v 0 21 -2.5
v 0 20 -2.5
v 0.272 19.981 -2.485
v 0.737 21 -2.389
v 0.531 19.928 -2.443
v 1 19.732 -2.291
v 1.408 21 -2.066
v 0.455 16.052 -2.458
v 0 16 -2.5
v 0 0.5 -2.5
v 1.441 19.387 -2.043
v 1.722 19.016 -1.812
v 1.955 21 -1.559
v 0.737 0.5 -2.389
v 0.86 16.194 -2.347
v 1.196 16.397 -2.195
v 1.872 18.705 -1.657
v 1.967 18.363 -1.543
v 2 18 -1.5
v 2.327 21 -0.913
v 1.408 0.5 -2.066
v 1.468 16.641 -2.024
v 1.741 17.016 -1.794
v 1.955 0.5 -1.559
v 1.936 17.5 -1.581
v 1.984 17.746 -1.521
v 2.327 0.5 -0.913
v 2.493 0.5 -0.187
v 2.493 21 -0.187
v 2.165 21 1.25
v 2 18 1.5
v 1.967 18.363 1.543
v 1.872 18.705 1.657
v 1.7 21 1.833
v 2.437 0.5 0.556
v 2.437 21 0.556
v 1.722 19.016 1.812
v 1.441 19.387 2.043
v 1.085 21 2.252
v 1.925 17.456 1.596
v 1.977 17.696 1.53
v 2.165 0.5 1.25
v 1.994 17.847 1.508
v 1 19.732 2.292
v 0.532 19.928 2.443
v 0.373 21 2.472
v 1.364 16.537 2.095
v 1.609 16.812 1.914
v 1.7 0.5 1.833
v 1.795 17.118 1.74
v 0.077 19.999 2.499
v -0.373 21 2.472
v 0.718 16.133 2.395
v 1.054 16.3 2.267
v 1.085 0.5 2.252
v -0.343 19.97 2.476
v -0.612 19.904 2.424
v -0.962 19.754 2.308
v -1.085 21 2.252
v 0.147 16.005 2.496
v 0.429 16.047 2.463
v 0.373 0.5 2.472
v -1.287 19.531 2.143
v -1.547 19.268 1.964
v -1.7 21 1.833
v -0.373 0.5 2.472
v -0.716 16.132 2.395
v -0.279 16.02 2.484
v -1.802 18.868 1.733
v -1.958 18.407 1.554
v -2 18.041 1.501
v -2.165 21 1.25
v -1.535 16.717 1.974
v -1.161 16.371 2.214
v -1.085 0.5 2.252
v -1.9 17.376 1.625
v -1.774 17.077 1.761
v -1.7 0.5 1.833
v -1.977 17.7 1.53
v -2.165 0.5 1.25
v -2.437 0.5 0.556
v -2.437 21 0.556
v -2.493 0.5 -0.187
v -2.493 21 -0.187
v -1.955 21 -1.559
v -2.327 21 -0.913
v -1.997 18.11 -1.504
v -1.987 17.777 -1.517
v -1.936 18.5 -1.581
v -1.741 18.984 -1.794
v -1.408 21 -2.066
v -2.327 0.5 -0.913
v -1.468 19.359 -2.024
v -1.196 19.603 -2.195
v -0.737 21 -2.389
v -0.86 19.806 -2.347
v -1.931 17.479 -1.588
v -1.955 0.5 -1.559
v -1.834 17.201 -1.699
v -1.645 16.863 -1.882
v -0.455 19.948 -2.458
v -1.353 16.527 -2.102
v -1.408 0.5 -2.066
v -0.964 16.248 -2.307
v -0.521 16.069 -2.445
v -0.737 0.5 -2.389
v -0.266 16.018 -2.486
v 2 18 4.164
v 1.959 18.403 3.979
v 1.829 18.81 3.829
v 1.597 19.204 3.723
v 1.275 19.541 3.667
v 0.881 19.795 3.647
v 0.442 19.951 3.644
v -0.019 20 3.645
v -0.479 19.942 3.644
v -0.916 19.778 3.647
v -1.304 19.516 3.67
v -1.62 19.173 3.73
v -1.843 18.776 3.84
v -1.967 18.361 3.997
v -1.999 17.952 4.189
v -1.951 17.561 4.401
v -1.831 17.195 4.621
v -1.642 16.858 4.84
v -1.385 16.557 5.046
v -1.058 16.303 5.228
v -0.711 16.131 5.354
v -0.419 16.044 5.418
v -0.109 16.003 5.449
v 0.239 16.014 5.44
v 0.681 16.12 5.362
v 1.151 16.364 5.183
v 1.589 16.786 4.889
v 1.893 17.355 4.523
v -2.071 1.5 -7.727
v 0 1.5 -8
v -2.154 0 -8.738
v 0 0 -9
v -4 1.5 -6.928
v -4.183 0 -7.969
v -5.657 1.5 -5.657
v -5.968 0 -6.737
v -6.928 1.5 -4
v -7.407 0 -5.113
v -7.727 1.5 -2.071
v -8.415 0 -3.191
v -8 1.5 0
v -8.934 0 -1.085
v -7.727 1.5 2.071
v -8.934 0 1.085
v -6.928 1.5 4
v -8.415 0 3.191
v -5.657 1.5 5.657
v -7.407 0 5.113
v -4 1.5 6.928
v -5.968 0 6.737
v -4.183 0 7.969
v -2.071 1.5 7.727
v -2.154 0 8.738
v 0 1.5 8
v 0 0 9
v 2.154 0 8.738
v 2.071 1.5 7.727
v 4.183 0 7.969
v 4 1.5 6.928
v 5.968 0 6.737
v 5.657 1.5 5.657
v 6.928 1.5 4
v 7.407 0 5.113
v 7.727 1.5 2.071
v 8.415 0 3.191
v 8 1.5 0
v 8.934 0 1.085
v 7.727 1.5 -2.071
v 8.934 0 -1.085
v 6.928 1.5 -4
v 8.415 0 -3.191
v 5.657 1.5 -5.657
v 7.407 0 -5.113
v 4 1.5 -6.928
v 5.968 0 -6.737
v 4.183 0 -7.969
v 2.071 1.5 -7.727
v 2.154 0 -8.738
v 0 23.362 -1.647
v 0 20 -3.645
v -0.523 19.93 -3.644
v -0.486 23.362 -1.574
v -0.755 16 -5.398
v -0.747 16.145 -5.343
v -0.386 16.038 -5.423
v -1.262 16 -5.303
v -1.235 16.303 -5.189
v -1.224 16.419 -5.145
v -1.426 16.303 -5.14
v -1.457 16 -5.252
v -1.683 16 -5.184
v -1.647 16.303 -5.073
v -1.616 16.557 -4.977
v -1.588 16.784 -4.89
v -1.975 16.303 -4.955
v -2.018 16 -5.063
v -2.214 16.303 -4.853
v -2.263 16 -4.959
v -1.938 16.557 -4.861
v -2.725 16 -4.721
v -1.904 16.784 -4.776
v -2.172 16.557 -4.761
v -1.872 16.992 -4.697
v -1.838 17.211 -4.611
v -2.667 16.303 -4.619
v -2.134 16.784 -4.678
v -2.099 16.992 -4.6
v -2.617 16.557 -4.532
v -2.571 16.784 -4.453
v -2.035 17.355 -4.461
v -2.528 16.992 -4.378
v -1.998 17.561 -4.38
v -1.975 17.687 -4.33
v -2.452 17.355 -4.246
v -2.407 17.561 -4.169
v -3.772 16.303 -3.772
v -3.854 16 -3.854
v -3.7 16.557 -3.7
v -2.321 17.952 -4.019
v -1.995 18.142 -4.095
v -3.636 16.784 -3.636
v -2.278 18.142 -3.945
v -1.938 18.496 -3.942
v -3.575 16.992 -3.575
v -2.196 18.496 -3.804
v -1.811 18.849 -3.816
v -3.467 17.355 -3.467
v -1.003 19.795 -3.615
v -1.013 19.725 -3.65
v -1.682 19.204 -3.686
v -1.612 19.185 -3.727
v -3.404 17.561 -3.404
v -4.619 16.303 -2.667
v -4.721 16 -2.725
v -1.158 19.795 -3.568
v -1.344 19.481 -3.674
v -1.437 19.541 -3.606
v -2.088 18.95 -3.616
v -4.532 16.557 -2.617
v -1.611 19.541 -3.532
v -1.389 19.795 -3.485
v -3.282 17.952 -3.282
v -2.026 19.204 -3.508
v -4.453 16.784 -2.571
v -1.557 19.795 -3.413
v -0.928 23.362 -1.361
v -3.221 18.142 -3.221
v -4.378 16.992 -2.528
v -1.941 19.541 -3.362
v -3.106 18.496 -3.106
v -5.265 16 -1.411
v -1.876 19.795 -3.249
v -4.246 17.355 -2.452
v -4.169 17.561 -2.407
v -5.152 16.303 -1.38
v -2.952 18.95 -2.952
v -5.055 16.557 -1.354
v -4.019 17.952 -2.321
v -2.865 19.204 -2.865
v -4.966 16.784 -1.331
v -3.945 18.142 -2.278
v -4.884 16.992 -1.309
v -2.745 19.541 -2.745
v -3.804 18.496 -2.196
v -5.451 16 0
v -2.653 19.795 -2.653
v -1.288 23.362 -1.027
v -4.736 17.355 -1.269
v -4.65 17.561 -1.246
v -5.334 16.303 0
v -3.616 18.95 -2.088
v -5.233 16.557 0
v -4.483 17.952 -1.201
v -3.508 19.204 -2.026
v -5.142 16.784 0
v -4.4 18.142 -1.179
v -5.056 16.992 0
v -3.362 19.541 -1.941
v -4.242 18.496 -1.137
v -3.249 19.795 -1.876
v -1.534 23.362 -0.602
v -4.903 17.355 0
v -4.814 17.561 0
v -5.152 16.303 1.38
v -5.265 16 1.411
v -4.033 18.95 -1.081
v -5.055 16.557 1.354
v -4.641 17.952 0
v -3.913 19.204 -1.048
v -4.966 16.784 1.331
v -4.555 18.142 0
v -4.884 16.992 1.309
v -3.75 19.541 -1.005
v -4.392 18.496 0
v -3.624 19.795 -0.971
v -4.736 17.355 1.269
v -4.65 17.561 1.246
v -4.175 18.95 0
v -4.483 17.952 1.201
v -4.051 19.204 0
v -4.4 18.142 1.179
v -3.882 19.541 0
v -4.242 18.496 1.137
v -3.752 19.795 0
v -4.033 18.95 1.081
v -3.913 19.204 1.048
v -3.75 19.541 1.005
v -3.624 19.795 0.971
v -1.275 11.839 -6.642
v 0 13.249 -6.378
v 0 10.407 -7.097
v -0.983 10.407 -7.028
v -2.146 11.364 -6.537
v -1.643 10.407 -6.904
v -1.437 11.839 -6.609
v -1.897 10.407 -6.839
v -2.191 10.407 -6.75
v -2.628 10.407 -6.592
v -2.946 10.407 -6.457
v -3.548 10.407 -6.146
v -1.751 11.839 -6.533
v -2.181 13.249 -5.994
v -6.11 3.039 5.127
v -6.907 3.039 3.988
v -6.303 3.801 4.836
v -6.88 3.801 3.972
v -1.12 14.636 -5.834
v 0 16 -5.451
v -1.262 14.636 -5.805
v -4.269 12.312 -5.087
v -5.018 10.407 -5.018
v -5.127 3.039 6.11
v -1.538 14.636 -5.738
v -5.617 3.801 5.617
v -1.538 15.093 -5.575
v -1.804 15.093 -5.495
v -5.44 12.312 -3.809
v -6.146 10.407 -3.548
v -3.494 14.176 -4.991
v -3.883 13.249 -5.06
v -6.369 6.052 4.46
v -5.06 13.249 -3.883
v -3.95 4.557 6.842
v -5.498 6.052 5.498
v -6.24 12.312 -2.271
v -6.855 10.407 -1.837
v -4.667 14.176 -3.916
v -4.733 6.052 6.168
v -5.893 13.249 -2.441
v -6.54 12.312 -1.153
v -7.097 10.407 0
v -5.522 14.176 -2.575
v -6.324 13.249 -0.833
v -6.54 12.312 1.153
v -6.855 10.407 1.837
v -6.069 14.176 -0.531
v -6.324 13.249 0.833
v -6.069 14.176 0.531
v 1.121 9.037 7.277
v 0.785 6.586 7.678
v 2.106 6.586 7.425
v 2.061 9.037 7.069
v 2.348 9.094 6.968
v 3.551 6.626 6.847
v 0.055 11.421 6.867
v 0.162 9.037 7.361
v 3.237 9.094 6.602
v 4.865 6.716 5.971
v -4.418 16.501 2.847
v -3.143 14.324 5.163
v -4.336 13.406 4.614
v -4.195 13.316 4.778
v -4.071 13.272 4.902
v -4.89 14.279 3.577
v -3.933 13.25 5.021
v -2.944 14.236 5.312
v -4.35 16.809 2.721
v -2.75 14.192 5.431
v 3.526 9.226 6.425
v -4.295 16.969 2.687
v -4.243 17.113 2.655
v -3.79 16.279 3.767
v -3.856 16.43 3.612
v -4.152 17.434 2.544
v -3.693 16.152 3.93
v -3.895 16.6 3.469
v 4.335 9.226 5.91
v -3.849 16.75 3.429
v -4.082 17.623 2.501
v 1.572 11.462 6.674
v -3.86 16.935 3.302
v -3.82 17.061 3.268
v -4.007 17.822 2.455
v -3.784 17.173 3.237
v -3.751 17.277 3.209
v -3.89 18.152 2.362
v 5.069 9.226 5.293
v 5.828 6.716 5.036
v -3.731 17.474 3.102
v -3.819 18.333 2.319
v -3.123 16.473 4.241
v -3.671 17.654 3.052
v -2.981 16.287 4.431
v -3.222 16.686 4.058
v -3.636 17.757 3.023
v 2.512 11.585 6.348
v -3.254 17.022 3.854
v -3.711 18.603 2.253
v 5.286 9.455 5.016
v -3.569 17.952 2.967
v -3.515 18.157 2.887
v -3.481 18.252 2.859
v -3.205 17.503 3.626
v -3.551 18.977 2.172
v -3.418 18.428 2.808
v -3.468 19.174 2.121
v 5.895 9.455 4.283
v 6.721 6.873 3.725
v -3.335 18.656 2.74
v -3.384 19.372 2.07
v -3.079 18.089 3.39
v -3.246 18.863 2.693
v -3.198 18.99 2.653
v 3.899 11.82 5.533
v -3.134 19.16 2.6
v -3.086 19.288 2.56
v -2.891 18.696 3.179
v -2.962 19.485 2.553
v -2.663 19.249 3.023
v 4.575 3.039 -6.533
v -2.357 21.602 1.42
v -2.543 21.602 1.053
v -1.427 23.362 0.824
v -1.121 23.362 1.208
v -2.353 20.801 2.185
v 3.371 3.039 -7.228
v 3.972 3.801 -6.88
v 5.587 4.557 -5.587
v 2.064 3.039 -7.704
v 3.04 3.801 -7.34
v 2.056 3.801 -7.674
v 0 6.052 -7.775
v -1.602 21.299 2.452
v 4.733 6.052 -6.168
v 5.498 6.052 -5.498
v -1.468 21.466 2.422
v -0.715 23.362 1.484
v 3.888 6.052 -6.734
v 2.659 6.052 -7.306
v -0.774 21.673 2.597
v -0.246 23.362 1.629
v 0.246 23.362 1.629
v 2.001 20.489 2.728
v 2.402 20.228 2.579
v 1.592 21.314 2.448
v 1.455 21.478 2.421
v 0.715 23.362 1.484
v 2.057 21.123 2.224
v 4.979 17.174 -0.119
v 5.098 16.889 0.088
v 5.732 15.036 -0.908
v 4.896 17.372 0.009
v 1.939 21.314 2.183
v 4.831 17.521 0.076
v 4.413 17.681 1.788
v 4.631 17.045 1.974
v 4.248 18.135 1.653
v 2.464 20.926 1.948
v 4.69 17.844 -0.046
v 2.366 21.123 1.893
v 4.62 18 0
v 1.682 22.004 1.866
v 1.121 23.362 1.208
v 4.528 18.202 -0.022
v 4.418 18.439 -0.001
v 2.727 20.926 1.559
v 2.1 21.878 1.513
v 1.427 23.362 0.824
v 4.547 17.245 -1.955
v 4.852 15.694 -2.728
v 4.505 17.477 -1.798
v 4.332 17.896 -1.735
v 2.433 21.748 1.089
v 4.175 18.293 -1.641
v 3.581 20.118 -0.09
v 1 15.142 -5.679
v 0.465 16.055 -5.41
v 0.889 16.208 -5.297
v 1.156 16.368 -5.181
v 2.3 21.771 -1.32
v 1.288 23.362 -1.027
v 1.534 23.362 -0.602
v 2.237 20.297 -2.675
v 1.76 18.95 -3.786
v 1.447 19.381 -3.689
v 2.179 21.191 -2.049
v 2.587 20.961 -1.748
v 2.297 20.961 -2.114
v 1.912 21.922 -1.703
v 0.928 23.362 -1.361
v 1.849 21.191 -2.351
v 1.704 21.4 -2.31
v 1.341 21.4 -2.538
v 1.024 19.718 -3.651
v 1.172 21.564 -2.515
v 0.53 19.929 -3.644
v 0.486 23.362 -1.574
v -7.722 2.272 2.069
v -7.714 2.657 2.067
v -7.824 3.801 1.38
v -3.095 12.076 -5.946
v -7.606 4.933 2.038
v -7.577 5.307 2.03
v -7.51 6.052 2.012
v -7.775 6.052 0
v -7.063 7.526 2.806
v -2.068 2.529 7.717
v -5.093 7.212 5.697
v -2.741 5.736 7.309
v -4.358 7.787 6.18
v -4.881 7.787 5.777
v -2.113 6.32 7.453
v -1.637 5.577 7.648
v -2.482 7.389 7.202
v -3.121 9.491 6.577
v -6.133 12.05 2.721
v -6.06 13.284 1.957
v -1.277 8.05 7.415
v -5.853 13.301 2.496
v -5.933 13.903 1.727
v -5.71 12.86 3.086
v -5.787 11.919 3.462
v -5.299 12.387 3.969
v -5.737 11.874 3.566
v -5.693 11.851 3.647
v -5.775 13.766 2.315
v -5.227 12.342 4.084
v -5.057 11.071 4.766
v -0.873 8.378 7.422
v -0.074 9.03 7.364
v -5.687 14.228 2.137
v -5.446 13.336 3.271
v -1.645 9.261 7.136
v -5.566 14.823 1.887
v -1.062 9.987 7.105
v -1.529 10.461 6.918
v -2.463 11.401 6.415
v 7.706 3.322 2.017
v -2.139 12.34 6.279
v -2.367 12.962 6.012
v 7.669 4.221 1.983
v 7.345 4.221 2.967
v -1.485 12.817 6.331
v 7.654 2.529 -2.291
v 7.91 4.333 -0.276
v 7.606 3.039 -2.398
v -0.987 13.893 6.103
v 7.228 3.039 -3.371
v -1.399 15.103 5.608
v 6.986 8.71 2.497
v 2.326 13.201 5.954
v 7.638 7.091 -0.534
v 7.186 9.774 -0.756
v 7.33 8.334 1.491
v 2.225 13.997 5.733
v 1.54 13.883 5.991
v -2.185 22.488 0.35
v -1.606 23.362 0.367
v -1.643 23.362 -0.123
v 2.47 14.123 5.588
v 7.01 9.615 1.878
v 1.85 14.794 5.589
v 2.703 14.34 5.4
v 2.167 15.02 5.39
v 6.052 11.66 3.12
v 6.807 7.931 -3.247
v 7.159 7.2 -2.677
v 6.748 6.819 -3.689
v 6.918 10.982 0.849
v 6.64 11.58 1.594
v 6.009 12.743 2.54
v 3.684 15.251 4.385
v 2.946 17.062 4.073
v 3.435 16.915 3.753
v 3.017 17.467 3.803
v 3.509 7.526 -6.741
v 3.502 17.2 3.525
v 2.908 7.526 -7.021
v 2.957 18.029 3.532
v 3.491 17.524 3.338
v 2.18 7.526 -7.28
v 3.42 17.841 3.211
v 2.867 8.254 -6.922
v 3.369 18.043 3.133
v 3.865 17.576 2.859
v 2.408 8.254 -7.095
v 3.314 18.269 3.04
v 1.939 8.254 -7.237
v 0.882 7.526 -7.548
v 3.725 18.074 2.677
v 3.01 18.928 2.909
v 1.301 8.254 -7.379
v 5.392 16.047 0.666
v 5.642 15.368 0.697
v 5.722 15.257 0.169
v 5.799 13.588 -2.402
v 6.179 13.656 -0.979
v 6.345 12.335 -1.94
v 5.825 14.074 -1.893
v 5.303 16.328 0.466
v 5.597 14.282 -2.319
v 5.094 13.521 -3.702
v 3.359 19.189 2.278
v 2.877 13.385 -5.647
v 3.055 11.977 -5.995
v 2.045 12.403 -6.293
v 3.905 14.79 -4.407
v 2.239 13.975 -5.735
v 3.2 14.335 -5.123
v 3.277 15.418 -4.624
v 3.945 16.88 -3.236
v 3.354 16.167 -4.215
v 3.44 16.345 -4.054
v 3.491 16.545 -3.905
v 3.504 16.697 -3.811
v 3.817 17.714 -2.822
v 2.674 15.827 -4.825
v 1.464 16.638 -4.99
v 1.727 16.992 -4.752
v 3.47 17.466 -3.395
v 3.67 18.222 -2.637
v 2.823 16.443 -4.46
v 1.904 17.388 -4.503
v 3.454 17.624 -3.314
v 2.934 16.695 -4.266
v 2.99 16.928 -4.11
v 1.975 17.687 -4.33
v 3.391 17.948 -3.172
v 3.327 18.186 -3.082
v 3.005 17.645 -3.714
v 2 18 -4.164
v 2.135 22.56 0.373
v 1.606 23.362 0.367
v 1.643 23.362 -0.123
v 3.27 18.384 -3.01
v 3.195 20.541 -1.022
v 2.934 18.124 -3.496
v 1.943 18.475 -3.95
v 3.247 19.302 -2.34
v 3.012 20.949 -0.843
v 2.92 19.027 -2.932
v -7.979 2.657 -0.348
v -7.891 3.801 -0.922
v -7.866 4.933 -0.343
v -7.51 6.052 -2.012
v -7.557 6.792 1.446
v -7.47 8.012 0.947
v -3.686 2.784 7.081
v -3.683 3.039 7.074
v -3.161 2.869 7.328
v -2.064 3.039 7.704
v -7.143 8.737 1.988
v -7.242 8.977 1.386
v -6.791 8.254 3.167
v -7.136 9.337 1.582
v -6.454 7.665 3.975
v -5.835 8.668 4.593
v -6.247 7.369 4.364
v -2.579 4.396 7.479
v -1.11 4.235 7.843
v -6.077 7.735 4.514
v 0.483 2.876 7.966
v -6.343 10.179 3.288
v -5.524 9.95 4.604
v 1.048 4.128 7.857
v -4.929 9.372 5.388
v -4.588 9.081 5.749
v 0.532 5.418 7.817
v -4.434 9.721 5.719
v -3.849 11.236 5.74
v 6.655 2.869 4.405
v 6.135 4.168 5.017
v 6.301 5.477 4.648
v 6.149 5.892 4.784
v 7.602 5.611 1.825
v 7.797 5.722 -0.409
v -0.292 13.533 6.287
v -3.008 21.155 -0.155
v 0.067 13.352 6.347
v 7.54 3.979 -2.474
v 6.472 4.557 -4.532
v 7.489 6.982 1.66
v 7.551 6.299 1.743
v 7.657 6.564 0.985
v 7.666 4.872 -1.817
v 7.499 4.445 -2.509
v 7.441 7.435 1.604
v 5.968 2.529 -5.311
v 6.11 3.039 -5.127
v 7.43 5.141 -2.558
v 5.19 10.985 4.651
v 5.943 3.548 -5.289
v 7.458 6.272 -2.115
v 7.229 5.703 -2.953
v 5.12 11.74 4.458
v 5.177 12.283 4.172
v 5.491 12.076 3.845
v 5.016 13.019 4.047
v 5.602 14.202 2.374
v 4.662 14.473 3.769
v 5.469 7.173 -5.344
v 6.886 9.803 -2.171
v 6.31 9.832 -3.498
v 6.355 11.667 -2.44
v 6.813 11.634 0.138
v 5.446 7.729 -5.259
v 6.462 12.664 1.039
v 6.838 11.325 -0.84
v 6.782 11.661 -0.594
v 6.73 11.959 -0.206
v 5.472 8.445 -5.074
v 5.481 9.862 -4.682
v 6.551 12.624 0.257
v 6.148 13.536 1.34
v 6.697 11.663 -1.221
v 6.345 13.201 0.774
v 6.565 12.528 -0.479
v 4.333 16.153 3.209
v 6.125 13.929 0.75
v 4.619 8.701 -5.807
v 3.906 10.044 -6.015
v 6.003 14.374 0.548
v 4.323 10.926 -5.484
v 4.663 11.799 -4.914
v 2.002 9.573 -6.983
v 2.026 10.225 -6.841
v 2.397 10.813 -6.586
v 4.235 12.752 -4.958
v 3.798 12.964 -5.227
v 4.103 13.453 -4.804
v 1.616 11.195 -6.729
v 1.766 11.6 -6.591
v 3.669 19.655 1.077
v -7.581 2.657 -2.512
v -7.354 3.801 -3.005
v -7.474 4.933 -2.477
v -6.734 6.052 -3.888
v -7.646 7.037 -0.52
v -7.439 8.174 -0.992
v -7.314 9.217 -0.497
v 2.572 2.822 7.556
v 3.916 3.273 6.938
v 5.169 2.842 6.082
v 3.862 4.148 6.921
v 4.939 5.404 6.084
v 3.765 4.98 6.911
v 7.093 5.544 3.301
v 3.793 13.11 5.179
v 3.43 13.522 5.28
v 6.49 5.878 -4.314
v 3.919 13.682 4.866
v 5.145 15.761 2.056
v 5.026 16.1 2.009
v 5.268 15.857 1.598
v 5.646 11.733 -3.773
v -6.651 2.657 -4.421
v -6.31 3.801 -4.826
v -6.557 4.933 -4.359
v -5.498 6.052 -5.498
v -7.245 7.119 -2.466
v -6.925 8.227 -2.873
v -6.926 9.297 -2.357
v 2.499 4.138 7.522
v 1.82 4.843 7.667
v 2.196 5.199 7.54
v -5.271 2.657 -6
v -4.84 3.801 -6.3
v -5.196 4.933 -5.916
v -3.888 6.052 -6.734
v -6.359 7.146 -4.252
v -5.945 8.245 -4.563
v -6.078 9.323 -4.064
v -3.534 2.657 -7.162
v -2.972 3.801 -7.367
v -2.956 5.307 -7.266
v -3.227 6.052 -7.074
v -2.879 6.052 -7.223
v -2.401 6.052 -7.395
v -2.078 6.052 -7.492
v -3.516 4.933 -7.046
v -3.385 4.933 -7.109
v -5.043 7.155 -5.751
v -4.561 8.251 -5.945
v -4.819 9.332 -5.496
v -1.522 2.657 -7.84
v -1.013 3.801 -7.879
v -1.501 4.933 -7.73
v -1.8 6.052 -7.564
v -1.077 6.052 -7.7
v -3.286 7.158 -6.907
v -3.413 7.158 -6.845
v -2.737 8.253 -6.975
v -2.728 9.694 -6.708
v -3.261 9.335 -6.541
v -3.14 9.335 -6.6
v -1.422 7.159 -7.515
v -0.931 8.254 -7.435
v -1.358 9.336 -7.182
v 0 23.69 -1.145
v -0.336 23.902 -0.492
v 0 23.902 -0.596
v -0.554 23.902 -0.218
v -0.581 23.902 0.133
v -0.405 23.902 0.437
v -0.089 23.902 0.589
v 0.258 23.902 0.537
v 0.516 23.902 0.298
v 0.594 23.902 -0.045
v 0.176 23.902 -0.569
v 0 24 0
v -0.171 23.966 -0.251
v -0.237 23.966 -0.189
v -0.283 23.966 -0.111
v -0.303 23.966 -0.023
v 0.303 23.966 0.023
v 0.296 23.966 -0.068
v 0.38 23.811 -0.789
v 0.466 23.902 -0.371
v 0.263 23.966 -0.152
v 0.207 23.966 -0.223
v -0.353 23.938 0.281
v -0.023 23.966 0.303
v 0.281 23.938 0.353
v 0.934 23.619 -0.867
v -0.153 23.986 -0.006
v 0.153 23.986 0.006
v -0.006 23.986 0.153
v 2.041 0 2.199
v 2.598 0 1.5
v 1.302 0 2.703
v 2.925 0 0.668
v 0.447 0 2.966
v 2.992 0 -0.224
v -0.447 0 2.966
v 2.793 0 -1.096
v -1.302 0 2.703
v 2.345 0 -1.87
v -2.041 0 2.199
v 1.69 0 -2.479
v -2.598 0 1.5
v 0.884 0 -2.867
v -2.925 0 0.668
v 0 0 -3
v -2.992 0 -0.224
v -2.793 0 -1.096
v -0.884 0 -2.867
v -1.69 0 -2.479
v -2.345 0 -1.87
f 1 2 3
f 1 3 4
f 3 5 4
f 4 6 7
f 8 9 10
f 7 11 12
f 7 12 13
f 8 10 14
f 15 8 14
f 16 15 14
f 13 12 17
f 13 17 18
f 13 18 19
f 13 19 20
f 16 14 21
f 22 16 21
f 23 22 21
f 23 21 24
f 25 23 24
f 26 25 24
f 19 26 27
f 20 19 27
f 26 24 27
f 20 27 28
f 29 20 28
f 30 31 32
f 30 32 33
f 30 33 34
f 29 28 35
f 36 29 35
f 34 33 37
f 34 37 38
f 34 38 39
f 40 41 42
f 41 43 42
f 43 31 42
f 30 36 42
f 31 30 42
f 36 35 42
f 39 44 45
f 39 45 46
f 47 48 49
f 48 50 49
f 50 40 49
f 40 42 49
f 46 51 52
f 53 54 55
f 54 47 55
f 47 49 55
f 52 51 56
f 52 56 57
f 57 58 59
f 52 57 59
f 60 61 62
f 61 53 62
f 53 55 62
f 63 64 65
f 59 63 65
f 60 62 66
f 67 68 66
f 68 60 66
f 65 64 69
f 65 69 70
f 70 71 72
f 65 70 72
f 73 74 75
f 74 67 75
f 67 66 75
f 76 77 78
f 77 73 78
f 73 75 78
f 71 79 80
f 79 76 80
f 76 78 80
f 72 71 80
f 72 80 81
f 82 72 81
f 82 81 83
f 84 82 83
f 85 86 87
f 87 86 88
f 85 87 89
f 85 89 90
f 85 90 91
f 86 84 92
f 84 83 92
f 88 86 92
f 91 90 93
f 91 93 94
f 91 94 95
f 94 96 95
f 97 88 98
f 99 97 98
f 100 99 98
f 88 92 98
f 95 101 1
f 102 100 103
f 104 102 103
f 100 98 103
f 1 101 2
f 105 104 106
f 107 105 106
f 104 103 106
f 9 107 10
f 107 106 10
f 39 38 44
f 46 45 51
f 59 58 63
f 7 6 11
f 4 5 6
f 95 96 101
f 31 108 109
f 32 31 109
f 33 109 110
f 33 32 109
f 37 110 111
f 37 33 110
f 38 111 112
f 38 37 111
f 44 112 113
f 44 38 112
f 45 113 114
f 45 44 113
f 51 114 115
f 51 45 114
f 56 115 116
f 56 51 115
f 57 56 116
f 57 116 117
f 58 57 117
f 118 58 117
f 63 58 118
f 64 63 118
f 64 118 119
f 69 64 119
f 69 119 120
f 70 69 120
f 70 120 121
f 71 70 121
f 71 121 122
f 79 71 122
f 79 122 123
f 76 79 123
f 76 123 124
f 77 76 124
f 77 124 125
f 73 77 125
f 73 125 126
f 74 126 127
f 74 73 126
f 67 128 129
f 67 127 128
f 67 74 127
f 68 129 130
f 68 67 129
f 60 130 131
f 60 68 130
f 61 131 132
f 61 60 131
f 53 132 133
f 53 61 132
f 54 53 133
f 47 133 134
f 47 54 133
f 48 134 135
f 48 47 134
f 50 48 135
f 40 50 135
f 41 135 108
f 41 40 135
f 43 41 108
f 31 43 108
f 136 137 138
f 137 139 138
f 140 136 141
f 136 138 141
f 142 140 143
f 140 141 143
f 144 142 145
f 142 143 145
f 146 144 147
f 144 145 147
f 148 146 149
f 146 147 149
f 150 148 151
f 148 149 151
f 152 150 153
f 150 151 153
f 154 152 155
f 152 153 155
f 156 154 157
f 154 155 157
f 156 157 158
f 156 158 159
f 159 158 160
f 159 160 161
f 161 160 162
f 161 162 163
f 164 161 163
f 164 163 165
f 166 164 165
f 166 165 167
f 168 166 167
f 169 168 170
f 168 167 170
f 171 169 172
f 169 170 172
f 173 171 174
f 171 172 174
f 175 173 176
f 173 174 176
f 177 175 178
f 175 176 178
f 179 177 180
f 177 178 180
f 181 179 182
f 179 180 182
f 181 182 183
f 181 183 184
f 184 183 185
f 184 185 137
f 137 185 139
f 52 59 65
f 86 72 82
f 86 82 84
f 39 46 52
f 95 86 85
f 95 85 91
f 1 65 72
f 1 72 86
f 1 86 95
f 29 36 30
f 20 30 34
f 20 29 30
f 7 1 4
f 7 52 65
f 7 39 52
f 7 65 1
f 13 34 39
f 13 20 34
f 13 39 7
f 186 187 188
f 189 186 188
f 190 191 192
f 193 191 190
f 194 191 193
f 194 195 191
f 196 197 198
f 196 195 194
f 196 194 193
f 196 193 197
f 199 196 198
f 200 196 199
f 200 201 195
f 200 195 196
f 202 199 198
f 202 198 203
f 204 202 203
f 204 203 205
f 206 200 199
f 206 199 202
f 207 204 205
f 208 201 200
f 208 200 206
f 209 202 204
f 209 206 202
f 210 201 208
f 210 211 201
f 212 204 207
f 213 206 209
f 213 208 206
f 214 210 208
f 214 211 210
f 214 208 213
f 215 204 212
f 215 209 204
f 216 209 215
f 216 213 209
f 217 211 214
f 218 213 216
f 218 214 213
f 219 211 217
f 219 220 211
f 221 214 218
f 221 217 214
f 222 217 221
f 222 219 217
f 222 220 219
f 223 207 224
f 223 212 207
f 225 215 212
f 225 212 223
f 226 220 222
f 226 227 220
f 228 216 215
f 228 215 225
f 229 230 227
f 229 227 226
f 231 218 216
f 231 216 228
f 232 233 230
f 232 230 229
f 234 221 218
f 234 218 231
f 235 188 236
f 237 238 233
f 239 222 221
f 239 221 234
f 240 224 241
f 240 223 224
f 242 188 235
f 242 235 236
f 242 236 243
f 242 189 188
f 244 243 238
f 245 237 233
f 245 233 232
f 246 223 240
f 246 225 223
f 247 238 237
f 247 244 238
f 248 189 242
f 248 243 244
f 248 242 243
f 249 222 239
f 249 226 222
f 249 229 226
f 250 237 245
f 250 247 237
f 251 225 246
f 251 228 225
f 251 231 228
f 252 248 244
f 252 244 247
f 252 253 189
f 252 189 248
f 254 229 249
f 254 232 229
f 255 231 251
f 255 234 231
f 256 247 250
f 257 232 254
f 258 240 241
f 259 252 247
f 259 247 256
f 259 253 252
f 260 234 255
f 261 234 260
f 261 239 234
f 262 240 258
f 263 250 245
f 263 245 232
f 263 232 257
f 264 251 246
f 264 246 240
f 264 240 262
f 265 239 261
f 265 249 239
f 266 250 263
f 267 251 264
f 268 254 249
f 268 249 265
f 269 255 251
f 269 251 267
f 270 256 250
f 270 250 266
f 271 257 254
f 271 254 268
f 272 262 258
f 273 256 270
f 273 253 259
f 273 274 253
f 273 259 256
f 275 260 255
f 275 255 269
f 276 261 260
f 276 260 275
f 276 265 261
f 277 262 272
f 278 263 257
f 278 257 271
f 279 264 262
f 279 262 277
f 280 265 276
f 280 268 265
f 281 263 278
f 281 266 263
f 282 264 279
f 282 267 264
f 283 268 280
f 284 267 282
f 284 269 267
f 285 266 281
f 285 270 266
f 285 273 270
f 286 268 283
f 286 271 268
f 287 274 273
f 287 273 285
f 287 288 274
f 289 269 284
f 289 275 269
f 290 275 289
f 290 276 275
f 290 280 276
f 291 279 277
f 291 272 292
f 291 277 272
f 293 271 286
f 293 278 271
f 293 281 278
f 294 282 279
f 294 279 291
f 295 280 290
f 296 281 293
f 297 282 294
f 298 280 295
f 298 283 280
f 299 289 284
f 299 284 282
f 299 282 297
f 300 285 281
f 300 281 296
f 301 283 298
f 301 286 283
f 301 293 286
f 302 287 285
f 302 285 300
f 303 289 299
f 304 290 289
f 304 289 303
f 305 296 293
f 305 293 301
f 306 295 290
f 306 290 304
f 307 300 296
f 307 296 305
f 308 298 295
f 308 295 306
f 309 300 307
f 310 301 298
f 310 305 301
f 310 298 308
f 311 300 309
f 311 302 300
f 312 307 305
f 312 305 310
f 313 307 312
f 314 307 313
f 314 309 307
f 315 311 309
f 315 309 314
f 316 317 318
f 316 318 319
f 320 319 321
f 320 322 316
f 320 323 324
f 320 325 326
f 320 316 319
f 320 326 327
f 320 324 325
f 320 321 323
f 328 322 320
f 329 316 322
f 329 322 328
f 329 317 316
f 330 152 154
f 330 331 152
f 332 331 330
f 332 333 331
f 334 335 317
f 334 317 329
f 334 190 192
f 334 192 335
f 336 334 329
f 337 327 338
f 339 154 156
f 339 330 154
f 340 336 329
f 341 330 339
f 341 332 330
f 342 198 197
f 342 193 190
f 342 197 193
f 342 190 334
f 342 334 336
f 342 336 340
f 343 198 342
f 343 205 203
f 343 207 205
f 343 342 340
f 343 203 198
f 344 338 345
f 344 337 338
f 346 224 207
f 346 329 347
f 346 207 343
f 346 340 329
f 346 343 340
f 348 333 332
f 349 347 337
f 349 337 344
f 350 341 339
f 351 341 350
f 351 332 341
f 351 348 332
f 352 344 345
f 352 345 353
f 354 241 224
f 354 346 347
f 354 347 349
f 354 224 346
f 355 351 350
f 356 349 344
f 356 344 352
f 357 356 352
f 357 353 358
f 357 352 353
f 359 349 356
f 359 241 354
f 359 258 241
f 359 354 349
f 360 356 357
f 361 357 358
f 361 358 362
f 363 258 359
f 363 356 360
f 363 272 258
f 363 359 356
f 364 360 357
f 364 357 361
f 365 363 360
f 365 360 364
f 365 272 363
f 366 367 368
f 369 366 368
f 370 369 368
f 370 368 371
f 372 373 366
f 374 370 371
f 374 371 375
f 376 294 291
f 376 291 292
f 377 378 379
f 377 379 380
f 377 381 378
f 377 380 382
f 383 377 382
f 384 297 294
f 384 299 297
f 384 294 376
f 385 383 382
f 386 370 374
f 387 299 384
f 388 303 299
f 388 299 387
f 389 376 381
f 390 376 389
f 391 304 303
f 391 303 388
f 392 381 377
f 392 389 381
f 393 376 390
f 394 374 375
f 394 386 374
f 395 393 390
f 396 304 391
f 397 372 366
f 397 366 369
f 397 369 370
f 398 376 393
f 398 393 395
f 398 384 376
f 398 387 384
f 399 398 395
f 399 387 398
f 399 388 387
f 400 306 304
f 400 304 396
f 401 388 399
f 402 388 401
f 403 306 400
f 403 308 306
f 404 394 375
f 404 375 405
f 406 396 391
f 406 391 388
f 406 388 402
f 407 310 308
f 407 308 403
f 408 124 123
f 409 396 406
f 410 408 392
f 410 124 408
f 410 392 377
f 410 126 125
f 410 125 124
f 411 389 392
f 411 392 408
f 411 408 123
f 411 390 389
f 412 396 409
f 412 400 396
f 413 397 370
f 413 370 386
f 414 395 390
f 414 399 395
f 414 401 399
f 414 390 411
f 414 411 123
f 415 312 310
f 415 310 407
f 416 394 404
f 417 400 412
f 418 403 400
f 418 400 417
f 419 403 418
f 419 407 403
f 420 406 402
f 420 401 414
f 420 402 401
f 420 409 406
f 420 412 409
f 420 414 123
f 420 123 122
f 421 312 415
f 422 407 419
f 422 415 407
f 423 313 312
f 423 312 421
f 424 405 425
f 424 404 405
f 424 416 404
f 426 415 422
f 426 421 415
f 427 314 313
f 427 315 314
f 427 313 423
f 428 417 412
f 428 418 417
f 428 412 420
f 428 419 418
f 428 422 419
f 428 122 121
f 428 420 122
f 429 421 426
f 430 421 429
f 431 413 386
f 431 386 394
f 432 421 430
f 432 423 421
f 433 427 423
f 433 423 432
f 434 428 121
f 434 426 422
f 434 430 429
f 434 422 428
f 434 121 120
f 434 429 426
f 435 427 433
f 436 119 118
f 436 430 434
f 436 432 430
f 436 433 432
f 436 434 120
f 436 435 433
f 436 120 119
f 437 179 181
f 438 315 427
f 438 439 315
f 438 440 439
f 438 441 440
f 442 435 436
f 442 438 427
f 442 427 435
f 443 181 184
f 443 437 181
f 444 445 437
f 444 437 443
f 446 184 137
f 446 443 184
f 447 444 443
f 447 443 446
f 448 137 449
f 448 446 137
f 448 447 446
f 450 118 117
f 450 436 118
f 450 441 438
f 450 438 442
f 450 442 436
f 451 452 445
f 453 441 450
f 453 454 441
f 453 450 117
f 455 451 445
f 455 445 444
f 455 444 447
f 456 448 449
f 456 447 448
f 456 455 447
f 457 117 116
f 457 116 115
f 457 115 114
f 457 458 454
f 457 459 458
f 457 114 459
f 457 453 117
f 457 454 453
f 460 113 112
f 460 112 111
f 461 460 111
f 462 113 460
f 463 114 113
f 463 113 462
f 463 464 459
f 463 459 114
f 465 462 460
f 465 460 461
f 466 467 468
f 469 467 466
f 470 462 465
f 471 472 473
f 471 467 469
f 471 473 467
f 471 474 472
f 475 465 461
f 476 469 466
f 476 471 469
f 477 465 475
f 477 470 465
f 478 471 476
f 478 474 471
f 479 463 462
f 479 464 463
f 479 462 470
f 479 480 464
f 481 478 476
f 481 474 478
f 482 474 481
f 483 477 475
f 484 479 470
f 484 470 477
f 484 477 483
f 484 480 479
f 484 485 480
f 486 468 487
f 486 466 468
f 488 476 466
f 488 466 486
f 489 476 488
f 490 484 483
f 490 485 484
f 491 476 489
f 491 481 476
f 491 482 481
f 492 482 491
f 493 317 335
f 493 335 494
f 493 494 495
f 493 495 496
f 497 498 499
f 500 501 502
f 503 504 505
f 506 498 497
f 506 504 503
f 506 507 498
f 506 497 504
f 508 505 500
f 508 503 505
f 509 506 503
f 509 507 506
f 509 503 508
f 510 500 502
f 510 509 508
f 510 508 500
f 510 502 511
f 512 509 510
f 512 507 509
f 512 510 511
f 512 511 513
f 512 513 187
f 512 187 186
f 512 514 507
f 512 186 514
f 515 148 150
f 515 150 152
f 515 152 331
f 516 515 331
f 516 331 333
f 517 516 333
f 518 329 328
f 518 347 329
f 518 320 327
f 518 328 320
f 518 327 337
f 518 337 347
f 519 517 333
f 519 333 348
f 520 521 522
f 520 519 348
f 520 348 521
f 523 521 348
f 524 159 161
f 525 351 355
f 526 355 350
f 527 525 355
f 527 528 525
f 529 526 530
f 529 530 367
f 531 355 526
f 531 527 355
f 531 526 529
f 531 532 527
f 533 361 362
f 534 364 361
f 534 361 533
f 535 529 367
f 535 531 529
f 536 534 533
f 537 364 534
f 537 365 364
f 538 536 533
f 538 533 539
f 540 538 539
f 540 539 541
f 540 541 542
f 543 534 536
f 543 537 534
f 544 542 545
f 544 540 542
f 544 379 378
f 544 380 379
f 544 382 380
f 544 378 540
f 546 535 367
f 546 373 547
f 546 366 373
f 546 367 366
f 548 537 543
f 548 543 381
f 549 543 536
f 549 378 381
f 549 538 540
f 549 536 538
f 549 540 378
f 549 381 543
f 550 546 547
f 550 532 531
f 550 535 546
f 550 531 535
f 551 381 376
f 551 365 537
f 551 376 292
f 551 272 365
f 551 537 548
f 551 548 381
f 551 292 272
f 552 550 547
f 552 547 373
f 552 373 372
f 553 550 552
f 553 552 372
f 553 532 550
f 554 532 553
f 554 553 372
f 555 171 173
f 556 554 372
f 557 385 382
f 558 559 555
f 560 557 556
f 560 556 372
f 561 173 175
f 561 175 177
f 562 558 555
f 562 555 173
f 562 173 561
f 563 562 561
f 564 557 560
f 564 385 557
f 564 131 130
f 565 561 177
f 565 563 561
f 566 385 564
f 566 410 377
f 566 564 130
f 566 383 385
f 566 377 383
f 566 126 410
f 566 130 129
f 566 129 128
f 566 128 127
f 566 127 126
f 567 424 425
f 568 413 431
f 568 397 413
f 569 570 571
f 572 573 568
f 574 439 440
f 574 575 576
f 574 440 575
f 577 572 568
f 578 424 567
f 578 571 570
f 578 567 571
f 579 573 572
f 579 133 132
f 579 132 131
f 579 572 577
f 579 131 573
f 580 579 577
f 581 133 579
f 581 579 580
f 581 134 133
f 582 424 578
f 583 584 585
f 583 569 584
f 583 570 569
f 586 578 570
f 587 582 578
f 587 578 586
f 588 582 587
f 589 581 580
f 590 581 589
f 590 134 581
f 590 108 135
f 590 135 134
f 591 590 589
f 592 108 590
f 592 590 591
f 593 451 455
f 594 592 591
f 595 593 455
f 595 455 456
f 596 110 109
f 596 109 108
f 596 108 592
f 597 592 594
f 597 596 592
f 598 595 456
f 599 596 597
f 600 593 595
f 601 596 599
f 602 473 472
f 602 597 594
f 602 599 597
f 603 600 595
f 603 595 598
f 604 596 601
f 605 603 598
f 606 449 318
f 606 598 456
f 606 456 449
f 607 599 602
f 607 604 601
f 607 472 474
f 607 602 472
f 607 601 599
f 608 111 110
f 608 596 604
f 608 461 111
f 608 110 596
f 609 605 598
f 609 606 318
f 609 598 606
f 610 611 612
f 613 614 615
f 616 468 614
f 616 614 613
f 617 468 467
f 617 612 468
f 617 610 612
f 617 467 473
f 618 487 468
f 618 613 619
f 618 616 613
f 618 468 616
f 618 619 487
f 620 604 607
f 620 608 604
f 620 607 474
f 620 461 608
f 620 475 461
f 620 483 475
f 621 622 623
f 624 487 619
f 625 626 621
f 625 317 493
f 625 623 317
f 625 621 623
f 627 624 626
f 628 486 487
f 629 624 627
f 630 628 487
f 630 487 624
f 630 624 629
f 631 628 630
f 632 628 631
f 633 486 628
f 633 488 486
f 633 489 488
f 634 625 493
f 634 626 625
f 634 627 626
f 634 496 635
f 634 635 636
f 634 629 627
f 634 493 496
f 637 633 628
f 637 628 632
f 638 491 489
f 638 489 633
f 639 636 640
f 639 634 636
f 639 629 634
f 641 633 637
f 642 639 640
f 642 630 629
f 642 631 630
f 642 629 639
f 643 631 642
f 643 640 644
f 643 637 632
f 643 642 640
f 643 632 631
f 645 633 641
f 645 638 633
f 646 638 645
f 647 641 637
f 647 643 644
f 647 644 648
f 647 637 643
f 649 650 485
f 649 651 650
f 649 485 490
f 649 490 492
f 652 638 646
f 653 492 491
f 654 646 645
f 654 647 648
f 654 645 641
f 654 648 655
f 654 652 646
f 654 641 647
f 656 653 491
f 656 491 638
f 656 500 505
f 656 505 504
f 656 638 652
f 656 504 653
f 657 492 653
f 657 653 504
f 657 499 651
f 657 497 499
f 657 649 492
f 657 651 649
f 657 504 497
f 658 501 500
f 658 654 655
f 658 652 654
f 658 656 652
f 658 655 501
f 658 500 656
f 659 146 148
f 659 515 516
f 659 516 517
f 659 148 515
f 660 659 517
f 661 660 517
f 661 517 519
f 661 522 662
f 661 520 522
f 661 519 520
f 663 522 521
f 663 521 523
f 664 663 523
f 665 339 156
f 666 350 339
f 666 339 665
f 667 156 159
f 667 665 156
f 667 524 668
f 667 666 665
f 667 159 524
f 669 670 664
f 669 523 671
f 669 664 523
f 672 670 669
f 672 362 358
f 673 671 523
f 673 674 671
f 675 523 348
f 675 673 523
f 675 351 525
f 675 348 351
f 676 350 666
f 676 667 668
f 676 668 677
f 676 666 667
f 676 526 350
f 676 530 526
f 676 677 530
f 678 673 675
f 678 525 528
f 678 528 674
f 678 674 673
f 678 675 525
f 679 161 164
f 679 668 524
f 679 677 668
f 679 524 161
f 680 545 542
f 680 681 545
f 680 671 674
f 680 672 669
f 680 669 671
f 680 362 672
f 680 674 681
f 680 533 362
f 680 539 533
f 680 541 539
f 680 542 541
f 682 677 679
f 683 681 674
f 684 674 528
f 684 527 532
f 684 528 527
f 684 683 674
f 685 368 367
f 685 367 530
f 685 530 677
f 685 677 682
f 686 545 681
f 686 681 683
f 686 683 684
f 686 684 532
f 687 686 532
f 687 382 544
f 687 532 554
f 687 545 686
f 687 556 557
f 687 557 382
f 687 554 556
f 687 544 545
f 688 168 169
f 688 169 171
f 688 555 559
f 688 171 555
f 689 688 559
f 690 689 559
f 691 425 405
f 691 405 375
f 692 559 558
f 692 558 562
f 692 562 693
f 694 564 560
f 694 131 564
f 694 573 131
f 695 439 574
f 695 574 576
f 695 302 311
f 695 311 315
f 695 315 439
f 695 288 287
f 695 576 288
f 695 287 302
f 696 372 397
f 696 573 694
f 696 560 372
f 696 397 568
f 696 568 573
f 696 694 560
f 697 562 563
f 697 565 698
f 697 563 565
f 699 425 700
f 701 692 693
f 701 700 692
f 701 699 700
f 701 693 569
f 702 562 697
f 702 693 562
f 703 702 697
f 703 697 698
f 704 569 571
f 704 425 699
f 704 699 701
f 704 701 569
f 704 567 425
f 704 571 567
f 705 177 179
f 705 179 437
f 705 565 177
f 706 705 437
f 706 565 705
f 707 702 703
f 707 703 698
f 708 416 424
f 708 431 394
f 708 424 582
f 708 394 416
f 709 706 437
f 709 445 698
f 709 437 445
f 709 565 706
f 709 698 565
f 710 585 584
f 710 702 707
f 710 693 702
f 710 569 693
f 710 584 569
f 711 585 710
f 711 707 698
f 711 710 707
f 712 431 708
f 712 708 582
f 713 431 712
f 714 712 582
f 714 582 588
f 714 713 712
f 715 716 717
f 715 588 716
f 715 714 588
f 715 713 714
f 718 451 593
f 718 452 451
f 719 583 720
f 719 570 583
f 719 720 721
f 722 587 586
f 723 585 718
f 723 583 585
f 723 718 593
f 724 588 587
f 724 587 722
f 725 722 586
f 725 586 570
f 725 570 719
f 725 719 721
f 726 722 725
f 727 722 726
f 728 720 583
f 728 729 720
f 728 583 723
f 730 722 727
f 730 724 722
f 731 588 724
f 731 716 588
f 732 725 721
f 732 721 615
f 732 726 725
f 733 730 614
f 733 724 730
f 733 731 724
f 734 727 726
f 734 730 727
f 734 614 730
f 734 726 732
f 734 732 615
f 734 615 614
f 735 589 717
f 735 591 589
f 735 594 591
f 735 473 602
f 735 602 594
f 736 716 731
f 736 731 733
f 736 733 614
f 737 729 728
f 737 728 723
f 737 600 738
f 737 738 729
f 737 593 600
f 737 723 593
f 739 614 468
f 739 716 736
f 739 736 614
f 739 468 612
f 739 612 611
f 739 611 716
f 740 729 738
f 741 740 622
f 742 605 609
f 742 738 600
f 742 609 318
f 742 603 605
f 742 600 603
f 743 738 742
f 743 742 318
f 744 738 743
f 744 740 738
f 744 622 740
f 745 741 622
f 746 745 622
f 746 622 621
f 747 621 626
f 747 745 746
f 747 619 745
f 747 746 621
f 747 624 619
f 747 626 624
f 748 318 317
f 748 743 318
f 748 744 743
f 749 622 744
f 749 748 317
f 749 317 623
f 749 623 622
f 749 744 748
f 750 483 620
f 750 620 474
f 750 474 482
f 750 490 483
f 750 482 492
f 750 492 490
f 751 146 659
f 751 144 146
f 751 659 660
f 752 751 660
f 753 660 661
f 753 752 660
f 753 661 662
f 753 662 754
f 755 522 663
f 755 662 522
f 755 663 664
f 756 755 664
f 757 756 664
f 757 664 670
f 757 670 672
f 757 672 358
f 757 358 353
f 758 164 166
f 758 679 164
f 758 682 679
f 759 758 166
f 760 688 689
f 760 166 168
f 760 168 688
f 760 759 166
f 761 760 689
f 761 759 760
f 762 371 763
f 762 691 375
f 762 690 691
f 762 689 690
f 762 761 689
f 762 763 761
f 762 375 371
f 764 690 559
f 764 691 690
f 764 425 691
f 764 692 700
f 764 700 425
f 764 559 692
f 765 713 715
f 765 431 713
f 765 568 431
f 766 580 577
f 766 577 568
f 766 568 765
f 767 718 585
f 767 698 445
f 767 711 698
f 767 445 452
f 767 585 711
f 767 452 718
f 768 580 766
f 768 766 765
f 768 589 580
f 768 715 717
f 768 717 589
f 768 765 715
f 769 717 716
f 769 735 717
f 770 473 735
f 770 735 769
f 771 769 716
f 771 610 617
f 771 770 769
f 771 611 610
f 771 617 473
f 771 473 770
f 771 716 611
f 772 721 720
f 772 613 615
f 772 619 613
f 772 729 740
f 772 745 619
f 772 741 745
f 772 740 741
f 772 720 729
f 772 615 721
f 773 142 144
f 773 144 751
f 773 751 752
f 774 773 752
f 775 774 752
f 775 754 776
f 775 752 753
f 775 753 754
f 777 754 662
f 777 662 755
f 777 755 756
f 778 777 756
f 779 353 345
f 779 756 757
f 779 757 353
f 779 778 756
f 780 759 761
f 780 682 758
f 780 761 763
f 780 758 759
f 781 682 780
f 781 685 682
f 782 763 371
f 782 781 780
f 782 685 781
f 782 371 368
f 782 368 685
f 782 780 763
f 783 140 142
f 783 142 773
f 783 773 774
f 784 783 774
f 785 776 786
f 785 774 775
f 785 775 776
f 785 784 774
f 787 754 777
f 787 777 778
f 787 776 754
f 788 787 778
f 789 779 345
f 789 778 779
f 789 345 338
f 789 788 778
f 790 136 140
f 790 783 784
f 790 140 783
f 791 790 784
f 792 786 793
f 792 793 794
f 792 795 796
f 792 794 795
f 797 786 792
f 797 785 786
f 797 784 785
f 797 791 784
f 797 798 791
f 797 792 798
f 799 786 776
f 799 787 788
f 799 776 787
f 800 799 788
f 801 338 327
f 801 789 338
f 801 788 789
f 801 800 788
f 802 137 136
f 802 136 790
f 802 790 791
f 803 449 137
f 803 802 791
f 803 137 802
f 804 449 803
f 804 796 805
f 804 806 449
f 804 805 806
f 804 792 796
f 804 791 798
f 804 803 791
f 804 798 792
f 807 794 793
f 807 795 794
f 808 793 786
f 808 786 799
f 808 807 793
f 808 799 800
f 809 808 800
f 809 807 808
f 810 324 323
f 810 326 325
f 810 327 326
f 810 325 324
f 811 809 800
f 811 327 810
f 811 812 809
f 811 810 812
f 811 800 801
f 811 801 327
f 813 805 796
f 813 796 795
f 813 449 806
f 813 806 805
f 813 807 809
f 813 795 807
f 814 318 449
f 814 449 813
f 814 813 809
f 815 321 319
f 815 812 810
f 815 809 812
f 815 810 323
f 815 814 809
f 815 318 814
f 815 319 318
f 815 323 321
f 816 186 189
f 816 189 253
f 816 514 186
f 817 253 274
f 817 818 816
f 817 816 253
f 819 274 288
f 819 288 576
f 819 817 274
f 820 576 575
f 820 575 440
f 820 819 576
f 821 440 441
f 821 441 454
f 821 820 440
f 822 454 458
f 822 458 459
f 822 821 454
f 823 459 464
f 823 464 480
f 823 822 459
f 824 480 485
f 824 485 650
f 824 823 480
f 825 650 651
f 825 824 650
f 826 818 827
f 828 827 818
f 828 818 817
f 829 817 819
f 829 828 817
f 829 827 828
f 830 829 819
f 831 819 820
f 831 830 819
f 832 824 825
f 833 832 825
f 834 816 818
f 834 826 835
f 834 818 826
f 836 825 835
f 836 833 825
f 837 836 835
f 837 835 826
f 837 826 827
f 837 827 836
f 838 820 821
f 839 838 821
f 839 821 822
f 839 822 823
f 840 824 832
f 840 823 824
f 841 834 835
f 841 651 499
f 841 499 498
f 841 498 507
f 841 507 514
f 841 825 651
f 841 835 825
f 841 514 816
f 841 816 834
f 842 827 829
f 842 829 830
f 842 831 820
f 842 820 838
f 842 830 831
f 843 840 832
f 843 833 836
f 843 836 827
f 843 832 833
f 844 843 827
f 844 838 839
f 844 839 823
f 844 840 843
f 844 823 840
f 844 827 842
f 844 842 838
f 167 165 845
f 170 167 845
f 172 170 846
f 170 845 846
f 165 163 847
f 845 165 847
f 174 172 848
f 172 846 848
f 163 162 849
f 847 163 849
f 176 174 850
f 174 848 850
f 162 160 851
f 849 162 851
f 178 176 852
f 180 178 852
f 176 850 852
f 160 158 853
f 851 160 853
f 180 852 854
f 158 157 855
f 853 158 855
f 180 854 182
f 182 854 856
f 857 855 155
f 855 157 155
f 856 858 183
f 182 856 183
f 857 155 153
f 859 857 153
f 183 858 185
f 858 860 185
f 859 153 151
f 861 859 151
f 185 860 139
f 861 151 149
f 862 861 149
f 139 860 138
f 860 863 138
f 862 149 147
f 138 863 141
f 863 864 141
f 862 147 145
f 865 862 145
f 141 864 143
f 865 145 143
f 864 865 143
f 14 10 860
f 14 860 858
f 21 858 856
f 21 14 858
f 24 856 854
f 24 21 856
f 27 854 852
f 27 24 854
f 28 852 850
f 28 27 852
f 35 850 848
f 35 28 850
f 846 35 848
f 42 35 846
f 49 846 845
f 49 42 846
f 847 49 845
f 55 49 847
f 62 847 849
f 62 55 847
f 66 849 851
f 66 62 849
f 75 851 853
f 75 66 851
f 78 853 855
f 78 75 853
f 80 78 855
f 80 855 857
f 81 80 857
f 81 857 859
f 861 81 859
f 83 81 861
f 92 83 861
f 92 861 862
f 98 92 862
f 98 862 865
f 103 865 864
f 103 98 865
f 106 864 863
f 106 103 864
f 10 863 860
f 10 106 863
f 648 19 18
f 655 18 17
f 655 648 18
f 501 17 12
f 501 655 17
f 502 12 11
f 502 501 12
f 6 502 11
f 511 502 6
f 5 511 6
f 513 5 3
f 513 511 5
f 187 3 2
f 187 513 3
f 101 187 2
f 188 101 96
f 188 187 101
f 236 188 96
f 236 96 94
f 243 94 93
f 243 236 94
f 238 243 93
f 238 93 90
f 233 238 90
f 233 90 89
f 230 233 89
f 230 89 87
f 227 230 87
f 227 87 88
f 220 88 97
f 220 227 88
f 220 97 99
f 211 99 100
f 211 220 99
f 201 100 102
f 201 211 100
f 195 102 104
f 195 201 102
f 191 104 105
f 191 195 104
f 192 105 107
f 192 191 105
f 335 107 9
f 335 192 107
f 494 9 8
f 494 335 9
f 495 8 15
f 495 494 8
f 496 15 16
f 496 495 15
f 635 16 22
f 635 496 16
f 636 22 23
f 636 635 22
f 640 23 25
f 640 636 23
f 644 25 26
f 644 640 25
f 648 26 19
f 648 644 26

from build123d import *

# Parameters (mm, degrees)
SKETCH3_R               = 2.5
CUT_EXTRUDE1_DEPTH      = 21
CHAMFER1_SIZE           = 0.5
CUT_EXTRUDE2_DEPTH      = 28.166155503
CUT_EXTRUDE2_DEPTH_BACK = 28.166155503
SKETCH4_R               = 2


with BuildPart() as part:
    # Sketch2 → Revolve1 (revolve)
    with BuildSketch(Plane.XY, mode=Mode.PRIVATE) as revolve1_sk:
        with BuildLine():
            add(Edge.make_bspline(
                [(8, 1.5), (8.005098379, 13.819525591), (1.647422345, 23.362221291)],
                knots=[0, 0, 0, 1, 1, 1], degree=2))
            add(Edge.make_bspline(
                [(1.647422345, 23.362221291), (0.928333001, 23.940015195), (0, 24)],
                knots=[0, 0, 0, 1, 1, 1], degree=2))
            Line((0, 24), (0, 1.5))
            Line((0, 1.5), (8, 1.5))
        make_face()
        Polygon((0, 0), (0, 1.5), (8, 1.5), (9, 0), align=None)
    revolve(revolve1_sk.sketch.rotate(Axis((0, 0, 0), (0, 1, 0)), 90), axis=Axis((0, 0, 0), (0, 1, 0)))

    # Sketch3 → Cut-Extrude1 (cut)
    with BuildSketch(Plane.XZ):
        with Locations(Location((0, 0, 0), (0, 0, 270))):
            Circle(SKETCH3_R)
    extrude(amount=-CUT_EXTRUDE1_DEPTH, mode=Mode.SUBTRACT)

    # Chamfer1
    chamfer1_edges = [part.edges().sort_by_distance(p)[0] for p in [
        (0, 0, 2.5),
    ]]
    chamfer(chamfer1_edges, length=CHAMFER1_SIZE)

    # Sketch4 → Cut-Extrude2 (cut, two sides: drawn at the far end of the back side and taken through both)
    with BuildSketch(Plane.XY.offset(-CUT_EXTRUDE2_DEPTH_BACK)):
        with Locations((0, 18)):
            Circle(SKETCH4_R)
    extrude(amount=CUT_EXTRUDE2_DEPTH + CUT_EXTRUDE2_DEPTH_BACK, mode=Mode.SUBTRACT)


solid = part.part
